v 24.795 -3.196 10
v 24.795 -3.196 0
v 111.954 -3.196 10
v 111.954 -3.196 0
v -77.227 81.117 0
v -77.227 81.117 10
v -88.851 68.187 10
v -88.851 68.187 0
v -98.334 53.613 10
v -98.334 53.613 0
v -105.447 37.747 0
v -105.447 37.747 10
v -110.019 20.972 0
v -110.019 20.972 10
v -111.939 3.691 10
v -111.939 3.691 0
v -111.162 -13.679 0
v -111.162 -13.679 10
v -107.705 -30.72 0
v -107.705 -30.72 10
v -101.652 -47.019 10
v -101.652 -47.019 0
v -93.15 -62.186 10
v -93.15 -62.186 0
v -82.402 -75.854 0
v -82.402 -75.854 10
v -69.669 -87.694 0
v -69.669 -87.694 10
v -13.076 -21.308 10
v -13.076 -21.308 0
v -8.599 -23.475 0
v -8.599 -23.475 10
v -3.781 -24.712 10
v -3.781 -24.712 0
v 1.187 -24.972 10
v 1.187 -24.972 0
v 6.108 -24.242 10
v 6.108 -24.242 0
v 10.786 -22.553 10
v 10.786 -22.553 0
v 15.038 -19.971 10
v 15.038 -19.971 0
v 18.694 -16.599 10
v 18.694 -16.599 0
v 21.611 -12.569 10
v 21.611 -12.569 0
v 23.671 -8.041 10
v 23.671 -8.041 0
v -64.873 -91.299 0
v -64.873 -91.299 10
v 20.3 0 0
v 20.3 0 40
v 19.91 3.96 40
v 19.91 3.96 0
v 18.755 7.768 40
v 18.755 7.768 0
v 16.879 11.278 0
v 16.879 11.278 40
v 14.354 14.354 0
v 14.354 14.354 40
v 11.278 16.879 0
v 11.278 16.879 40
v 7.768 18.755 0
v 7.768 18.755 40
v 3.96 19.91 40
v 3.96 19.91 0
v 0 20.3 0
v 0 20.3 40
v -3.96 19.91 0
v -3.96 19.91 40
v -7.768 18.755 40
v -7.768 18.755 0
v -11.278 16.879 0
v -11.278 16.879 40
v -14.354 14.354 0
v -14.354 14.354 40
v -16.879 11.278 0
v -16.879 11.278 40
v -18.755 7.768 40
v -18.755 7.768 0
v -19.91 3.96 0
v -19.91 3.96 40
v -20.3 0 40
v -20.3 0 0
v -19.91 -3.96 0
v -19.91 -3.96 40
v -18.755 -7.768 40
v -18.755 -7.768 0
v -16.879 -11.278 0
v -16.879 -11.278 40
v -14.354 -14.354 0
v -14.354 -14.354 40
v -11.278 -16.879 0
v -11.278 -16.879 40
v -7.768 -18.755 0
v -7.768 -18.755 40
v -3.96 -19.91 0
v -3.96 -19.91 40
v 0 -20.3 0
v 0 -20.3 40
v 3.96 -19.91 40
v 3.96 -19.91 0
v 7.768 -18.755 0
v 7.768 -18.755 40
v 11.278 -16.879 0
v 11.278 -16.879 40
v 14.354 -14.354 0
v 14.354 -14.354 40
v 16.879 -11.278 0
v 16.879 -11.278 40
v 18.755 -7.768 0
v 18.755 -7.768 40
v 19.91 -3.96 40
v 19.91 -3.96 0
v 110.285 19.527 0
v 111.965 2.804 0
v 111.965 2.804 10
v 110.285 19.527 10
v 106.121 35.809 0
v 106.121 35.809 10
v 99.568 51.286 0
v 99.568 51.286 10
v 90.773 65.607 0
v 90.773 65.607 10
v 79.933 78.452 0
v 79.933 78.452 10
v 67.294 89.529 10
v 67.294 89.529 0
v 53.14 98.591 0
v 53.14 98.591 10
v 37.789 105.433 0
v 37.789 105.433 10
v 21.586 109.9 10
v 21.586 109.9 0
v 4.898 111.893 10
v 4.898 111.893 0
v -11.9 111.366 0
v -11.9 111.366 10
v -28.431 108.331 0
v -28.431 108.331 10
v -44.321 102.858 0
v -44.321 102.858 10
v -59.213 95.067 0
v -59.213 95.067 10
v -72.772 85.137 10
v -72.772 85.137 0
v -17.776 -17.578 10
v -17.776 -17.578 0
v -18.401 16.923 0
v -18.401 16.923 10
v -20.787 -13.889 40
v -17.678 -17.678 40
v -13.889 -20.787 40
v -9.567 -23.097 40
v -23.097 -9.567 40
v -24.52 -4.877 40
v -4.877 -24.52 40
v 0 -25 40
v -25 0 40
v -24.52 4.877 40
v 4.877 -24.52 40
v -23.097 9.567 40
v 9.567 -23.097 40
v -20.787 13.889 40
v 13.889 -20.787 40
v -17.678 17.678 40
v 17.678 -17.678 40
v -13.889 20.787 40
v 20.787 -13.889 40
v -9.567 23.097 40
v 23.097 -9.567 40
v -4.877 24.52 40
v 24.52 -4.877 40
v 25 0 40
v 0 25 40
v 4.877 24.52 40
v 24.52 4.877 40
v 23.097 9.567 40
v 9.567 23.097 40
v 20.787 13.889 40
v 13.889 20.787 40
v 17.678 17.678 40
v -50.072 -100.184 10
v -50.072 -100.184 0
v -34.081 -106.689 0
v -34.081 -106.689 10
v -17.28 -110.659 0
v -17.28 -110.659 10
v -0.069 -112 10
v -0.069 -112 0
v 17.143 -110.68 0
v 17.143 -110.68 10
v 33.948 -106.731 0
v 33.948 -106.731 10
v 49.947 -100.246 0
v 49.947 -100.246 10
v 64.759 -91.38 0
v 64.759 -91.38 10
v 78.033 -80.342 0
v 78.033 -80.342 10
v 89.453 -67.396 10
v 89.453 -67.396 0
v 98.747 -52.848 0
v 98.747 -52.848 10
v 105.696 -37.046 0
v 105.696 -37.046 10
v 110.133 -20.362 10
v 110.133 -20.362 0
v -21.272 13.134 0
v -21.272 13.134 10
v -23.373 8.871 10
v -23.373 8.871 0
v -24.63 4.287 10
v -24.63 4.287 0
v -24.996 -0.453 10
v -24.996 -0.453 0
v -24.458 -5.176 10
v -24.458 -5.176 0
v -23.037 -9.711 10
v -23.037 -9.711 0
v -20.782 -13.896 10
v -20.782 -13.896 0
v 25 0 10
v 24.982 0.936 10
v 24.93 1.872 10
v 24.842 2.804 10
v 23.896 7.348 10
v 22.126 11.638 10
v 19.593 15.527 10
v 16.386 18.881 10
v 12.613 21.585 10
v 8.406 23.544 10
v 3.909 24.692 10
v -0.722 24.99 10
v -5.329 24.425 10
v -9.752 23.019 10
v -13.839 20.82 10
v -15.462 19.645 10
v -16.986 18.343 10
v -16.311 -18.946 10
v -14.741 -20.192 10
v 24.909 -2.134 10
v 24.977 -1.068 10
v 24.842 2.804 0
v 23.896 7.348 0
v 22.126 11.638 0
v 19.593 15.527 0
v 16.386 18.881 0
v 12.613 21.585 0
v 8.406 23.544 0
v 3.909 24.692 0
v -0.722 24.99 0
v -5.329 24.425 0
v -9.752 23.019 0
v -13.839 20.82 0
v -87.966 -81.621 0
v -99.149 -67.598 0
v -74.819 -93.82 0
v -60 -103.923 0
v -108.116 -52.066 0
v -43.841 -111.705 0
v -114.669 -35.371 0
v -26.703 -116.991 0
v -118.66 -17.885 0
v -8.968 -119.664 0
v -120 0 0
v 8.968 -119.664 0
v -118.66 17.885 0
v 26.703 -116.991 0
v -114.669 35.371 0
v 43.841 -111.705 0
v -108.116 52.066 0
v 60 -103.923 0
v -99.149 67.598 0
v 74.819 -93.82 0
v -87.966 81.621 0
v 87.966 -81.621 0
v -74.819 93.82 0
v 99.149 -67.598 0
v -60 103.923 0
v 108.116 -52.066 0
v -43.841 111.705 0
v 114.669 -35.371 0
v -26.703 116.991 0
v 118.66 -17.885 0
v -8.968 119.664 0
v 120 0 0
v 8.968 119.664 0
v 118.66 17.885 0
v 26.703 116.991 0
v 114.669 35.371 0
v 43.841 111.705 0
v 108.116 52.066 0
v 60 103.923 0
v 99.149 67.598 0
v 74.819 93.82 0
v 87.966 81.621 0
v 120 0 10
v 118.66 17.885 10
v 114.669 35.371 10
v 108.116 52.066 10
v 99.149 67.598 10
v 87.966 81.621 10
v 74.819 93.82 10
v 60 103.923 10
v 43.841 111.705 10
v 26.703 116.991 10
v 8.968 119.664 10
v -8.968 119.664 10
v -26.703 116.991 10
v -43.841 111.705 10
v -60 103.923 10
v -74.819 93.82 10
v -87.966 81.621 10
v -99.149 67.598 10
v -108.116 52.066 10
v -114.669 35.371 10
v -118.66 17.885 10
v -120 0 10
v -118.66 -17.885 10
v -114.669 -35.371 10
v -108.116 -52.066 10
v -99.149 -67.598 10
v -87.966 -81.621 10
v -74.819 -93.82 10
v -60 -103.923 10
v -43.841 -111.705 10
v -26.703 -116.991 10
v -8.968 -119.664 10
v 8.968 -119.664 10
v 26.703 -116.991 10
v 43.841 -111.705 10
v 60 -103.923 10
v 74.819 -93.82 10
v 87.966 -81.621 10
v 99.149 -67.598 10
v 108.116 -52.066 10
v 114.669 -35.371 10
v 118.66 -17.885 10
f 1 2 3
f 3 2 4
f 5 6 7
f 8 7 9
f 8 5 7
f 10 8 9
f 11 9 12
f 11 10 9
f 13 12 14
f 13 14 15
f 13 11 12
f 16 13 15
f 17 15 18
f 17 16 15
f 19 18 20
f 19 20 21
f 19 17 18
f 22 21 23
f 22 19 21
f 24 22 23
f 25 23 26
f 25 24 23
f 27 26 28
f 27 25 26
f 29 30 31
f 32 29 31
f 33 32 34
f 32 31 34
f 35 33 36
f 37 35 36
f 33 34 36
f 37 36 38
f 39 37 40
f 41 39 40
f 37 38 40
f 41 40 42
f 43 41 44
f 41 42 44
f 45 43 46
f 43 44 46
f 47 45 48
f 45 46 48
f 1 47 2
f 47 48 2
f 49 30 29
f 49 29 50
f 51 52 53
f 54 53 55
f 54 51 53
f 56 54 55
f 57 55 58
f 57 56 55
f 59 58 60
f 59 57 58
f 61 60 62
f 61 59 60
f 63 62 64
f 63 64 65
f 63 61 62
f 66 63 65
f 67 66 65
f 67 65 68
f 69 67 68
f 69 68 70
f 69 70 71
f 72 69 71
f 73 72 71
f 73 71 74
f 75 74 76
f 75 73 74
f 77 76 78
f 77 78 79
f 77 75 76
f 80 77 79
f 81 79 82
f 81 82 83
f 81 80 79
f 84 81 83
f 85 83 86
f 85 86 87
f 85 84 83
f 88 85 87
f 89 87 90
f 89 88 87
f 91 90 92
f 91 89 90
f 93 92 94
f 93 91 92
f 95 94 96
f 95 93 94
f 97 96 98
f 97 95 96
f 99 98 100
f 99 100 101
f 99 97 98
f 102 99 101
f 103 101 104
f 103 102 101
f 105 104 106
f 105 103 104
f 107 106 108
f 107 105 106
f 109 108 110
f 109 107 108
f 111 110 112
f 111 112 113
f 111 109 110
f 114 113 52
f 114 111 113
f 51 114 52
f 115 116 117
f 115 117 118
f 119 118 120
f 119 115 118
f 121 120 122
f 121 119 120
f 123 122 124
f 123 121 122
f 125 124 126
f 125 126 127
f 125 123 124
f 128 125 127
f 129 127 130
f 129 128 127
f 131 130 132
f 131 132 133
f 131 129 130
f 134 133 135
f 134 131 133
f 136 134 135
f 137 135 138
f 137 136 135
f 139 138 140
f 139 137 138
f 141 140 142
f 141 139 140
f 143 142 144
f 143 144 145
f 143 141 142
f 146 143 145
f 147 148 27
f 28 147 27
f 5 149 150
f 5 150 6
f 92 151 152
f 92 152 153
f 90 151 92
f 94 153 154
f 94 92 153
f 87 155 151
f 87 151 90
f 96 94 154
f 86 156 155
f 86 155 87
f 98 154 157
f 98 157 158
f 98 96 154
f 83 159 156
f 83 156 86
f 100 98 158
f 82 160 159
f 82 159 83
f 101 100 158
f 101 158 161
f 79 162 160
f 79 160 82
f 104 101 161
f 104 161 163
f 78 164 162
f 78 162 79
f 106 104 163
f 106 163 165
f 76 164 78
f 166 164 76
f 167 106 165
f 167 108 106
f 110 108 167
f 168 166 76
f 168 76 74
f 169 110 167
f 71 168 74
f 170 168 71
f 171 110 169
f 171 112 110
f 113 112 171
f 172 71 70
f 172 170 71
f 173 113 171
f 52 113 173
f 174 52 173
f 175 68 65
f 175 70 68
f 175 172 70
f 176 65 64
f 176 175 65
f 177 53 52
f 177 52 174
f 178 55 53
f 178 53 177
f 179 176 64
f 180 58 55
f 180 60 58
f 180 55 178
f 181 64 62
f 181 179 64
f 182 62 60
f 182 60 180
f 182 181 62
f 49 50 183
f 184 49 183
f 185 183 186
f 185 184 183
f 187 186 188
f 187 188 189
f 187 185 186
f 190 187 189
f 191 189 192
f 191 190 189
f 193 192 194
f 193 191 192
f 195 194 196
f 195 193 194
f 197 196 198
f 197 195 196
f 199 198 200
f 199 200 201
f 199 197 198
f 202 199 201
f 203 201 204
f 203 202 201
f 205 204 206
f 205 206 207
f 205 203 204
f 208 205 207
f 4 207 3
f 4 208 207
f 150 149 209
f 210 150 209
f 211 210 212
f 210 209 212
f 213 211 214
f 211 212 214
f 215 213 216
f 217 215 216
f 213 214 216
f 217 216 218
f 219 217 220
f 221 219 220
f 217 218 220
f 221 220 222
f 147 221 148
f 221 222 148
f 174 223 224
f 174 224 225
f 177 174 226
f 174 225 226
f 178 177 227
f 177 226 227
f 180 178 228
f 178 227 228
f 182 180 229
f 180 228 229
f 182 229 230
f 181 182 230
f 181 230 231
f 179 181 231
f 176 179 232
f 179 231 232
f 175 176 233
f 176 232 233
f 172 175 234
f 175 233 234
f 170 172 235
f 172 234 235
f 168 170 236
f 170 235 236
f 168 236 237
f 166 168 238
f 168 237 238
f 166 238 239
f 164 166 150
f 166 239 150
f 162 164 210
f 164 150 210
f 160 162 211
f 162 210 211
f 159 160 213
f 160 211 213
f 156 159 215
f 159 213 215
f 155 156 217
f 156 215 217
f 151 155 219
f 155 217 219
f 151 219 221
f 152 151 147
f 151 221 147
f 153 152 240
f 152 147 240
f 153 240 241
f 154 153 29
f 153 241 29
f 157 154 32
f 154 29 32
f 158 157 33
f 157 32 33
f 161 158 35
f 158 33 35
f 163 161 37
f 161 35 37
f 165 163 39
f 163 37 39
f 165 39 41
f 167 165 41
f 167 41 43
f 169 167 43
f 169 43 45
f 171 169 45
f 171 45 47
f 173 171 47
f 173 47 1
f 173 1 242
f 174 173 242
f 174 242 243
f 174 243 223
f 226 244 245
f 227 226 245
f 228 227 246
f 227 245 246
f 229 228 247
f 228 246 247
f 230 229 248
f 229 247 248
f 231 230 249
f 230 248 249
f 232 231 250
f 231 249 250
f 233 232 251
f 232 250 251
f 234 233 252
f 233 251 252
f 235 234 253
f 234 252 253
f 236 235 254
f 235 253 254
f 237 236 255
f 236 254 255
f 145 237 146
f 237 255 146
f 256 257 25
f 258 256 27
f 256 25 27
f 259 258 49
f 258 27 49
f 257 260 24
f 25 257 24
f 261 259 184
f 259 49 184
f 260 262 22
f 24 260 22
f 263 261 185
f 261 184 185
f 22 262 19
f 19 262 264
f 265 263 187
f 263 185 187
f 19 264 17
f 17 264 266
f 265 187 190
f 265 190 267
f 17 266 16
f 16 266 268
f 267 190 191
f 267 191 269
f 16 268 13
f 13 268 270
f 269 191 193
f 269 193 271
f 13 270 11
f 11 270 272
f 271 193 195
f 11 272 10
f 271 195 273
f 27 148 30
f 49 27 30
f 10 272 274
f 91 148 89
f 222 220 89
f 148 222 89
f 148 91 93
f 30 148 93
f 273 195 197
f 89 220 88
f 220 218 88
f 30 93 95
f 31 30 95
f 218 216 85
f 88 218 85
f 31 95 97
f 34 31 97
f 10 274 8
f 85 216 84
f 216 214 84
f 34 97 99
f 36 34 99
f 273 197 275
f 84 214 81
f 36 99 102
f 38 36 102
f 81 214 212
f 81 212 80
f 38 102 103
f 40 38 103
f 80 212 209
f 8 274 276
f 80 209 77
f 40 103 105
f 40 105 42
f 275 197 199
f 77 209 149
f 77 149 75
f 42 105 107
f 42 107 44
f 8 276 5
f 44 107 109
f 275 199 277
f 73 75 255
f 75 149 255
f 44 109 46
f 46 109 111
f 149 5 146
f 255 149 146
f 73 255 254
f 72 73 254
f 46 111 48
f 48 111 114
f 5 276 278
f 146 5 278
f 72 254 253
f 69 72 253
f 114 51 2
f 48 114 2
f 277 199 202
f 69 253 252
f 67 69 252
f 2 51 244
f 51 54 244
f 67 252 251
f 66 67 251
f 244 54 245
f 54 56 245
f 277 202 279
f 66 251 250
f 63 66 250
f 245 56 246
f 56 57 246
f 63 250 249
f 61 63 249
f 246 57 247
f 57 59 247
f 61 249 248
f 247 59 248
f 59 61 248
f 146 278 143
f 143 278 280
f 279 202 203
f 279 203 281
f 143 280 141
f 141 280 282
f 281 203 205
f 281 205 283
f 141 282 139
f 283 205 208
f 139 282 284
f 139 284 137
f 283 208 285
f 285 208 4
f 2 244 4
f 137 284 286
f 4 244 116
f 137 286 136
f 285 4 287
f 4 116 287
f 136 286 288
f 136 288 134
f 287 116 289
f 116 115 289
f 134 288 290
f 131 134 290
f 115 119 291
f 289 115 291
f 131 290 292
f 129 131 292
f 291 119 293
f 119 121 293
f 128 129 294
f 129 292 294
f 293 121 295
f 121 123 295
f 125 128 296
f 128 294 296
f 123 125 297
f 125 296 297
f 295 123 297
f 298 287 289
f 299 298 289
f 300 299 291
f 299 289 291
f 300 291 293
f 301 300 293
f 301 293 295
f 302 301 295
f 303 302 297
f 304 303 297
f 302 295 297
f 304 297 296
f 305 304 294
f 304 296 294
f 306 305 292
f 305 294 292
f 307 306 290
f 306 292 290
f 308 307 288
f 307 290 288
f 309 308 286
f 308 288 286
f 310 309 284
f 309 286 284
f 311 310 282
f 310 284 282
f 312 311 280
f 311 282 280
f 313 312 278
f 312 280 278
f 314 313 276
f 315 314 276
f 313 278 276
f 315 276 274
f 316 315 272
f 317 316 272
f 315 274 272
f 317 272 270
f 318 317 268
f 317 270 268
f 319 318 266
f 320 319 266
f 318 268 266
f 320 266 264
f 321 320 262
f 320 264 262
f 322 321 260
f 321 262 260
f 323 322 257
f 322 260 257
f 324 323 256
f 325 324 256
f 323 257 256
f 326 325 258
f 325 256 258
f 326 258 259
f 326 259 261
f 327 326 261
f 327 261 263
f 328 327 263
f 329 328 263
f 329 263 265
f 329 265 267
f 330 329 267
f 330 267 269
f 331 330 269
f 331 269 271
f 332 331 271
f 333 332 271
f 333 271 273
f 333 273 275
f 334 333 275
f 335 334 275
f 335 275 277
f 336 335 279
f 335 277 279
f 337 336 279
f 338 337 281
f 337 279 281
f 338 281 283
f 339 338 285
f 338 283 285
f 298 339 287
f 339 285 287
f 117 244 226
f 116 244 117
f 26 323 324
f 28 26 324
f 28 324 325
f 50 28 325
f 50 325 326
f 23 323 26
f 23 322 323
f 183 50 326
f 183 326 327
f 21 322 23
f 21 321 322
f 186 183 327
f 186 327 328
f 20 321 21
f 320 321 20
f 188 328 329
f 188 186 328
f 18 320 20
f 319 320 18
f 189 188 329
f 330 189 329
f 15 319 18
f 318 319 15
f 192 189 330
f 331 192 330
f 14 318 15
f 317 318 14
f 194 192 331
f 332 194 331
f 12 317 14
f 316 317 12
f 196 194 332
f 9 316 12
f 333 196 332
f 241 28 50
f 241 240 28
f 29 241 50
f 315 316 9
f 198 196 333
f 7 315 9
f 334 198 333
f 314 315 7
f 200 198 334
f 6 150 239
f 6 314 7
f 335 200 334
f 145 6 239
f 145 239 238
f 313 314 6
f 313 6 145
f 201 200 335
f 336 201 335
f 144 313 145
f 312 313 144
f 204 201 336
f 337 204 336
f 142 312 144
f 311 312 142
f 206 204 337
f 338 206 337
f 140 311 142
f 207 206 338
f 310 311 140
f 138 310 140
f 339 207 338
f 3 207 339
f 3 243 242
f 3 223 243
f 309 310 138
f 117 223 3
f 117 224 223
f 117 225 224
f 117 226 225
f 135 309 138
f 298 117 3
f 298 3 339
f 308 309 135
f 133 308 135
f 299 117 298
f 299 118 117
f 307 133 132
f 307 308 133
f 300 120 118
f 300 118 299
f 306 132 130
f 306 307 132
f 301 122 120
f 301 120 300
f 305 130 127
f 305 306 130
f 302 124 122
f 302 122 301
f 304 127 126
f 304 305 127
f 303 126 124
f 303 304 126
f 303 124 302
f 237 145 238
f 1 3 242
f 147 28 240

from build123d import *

# Parameters (mm, degrees)
SKETCH_R      = 120
SKETCH_R_2    = 20.3
PAD_DEPTH     = 10
SKETCH001_R   = 25
SKETCH001_R_2 = 20.3
PAD001_DEPTH  = 30


with BuildPart() as part:
    # Sketch → Pad (new body)
    with BuildSketch(Plane.XY):
        Circle(SKETCH_R)
        Circle(SKETCH_R_2, mode=Mode.SUBTRACT)
        with BuildLine():
            ThreePointArc((111.964891, 2.804147), (45.592578, 102.300131), (-72.7719, 85.136658))
            Line((-13.839048, 20.8202), (-72.7719, 85.136658))
            ThreePointArc((24.842237, 2.804147), (10.555192, 22.662478), (-13.839048, 20.8202))
            Line((24.842237, 2.804147), (111.964891, 2.804147))
        make_face(mode=Mode.SUBTRACT)
        with BuildLine():
            Line((24.794913, -3.195666), (111.9544, -3.195666))
            ThreePointArc((-64.872706, -91.299135), (49.94724, -100.246063), (111.9544, -3.195666))
            Line((-13.075988, -21.307711), (-64.872706, -91.299135))
            ThreePointArc((-13.075988, -21.307711), (10.786327, -22.553385), (24.794913, -3.195666))
        make_face(mode=Mode.SUBTRACT)
        with BuildLine():
            Line((-17.776297, -17.578489), (-69.668887, -87.694049))
            ThreePointArc((-77.226732, 81.117395), (-111.88792, -5.009326), (-69.668887, -87.694049))
            Line((-18.401224, 16.923208), (-77.226732, 81.117395))
            ThreePointArc((-18.401224, 16.923208), (-24.9959, -0.452749), (-17.776297, -17.578489))
        make_face(mode=Mode.SUBTRACT)
    extrude(amount=PAD_DEPTH)

    # Sketch001 (on Face16 of Pad) → Pad001 (join)
    with BuildSketch(Plane.XY.offset(10)):
        Circle(SKETCH001_R)
        Circle(SKETCH001_R_2, mode=Mode.SUBTRACT)
    extrude(amount=PAD001_DEPTH)


solid = part.part
